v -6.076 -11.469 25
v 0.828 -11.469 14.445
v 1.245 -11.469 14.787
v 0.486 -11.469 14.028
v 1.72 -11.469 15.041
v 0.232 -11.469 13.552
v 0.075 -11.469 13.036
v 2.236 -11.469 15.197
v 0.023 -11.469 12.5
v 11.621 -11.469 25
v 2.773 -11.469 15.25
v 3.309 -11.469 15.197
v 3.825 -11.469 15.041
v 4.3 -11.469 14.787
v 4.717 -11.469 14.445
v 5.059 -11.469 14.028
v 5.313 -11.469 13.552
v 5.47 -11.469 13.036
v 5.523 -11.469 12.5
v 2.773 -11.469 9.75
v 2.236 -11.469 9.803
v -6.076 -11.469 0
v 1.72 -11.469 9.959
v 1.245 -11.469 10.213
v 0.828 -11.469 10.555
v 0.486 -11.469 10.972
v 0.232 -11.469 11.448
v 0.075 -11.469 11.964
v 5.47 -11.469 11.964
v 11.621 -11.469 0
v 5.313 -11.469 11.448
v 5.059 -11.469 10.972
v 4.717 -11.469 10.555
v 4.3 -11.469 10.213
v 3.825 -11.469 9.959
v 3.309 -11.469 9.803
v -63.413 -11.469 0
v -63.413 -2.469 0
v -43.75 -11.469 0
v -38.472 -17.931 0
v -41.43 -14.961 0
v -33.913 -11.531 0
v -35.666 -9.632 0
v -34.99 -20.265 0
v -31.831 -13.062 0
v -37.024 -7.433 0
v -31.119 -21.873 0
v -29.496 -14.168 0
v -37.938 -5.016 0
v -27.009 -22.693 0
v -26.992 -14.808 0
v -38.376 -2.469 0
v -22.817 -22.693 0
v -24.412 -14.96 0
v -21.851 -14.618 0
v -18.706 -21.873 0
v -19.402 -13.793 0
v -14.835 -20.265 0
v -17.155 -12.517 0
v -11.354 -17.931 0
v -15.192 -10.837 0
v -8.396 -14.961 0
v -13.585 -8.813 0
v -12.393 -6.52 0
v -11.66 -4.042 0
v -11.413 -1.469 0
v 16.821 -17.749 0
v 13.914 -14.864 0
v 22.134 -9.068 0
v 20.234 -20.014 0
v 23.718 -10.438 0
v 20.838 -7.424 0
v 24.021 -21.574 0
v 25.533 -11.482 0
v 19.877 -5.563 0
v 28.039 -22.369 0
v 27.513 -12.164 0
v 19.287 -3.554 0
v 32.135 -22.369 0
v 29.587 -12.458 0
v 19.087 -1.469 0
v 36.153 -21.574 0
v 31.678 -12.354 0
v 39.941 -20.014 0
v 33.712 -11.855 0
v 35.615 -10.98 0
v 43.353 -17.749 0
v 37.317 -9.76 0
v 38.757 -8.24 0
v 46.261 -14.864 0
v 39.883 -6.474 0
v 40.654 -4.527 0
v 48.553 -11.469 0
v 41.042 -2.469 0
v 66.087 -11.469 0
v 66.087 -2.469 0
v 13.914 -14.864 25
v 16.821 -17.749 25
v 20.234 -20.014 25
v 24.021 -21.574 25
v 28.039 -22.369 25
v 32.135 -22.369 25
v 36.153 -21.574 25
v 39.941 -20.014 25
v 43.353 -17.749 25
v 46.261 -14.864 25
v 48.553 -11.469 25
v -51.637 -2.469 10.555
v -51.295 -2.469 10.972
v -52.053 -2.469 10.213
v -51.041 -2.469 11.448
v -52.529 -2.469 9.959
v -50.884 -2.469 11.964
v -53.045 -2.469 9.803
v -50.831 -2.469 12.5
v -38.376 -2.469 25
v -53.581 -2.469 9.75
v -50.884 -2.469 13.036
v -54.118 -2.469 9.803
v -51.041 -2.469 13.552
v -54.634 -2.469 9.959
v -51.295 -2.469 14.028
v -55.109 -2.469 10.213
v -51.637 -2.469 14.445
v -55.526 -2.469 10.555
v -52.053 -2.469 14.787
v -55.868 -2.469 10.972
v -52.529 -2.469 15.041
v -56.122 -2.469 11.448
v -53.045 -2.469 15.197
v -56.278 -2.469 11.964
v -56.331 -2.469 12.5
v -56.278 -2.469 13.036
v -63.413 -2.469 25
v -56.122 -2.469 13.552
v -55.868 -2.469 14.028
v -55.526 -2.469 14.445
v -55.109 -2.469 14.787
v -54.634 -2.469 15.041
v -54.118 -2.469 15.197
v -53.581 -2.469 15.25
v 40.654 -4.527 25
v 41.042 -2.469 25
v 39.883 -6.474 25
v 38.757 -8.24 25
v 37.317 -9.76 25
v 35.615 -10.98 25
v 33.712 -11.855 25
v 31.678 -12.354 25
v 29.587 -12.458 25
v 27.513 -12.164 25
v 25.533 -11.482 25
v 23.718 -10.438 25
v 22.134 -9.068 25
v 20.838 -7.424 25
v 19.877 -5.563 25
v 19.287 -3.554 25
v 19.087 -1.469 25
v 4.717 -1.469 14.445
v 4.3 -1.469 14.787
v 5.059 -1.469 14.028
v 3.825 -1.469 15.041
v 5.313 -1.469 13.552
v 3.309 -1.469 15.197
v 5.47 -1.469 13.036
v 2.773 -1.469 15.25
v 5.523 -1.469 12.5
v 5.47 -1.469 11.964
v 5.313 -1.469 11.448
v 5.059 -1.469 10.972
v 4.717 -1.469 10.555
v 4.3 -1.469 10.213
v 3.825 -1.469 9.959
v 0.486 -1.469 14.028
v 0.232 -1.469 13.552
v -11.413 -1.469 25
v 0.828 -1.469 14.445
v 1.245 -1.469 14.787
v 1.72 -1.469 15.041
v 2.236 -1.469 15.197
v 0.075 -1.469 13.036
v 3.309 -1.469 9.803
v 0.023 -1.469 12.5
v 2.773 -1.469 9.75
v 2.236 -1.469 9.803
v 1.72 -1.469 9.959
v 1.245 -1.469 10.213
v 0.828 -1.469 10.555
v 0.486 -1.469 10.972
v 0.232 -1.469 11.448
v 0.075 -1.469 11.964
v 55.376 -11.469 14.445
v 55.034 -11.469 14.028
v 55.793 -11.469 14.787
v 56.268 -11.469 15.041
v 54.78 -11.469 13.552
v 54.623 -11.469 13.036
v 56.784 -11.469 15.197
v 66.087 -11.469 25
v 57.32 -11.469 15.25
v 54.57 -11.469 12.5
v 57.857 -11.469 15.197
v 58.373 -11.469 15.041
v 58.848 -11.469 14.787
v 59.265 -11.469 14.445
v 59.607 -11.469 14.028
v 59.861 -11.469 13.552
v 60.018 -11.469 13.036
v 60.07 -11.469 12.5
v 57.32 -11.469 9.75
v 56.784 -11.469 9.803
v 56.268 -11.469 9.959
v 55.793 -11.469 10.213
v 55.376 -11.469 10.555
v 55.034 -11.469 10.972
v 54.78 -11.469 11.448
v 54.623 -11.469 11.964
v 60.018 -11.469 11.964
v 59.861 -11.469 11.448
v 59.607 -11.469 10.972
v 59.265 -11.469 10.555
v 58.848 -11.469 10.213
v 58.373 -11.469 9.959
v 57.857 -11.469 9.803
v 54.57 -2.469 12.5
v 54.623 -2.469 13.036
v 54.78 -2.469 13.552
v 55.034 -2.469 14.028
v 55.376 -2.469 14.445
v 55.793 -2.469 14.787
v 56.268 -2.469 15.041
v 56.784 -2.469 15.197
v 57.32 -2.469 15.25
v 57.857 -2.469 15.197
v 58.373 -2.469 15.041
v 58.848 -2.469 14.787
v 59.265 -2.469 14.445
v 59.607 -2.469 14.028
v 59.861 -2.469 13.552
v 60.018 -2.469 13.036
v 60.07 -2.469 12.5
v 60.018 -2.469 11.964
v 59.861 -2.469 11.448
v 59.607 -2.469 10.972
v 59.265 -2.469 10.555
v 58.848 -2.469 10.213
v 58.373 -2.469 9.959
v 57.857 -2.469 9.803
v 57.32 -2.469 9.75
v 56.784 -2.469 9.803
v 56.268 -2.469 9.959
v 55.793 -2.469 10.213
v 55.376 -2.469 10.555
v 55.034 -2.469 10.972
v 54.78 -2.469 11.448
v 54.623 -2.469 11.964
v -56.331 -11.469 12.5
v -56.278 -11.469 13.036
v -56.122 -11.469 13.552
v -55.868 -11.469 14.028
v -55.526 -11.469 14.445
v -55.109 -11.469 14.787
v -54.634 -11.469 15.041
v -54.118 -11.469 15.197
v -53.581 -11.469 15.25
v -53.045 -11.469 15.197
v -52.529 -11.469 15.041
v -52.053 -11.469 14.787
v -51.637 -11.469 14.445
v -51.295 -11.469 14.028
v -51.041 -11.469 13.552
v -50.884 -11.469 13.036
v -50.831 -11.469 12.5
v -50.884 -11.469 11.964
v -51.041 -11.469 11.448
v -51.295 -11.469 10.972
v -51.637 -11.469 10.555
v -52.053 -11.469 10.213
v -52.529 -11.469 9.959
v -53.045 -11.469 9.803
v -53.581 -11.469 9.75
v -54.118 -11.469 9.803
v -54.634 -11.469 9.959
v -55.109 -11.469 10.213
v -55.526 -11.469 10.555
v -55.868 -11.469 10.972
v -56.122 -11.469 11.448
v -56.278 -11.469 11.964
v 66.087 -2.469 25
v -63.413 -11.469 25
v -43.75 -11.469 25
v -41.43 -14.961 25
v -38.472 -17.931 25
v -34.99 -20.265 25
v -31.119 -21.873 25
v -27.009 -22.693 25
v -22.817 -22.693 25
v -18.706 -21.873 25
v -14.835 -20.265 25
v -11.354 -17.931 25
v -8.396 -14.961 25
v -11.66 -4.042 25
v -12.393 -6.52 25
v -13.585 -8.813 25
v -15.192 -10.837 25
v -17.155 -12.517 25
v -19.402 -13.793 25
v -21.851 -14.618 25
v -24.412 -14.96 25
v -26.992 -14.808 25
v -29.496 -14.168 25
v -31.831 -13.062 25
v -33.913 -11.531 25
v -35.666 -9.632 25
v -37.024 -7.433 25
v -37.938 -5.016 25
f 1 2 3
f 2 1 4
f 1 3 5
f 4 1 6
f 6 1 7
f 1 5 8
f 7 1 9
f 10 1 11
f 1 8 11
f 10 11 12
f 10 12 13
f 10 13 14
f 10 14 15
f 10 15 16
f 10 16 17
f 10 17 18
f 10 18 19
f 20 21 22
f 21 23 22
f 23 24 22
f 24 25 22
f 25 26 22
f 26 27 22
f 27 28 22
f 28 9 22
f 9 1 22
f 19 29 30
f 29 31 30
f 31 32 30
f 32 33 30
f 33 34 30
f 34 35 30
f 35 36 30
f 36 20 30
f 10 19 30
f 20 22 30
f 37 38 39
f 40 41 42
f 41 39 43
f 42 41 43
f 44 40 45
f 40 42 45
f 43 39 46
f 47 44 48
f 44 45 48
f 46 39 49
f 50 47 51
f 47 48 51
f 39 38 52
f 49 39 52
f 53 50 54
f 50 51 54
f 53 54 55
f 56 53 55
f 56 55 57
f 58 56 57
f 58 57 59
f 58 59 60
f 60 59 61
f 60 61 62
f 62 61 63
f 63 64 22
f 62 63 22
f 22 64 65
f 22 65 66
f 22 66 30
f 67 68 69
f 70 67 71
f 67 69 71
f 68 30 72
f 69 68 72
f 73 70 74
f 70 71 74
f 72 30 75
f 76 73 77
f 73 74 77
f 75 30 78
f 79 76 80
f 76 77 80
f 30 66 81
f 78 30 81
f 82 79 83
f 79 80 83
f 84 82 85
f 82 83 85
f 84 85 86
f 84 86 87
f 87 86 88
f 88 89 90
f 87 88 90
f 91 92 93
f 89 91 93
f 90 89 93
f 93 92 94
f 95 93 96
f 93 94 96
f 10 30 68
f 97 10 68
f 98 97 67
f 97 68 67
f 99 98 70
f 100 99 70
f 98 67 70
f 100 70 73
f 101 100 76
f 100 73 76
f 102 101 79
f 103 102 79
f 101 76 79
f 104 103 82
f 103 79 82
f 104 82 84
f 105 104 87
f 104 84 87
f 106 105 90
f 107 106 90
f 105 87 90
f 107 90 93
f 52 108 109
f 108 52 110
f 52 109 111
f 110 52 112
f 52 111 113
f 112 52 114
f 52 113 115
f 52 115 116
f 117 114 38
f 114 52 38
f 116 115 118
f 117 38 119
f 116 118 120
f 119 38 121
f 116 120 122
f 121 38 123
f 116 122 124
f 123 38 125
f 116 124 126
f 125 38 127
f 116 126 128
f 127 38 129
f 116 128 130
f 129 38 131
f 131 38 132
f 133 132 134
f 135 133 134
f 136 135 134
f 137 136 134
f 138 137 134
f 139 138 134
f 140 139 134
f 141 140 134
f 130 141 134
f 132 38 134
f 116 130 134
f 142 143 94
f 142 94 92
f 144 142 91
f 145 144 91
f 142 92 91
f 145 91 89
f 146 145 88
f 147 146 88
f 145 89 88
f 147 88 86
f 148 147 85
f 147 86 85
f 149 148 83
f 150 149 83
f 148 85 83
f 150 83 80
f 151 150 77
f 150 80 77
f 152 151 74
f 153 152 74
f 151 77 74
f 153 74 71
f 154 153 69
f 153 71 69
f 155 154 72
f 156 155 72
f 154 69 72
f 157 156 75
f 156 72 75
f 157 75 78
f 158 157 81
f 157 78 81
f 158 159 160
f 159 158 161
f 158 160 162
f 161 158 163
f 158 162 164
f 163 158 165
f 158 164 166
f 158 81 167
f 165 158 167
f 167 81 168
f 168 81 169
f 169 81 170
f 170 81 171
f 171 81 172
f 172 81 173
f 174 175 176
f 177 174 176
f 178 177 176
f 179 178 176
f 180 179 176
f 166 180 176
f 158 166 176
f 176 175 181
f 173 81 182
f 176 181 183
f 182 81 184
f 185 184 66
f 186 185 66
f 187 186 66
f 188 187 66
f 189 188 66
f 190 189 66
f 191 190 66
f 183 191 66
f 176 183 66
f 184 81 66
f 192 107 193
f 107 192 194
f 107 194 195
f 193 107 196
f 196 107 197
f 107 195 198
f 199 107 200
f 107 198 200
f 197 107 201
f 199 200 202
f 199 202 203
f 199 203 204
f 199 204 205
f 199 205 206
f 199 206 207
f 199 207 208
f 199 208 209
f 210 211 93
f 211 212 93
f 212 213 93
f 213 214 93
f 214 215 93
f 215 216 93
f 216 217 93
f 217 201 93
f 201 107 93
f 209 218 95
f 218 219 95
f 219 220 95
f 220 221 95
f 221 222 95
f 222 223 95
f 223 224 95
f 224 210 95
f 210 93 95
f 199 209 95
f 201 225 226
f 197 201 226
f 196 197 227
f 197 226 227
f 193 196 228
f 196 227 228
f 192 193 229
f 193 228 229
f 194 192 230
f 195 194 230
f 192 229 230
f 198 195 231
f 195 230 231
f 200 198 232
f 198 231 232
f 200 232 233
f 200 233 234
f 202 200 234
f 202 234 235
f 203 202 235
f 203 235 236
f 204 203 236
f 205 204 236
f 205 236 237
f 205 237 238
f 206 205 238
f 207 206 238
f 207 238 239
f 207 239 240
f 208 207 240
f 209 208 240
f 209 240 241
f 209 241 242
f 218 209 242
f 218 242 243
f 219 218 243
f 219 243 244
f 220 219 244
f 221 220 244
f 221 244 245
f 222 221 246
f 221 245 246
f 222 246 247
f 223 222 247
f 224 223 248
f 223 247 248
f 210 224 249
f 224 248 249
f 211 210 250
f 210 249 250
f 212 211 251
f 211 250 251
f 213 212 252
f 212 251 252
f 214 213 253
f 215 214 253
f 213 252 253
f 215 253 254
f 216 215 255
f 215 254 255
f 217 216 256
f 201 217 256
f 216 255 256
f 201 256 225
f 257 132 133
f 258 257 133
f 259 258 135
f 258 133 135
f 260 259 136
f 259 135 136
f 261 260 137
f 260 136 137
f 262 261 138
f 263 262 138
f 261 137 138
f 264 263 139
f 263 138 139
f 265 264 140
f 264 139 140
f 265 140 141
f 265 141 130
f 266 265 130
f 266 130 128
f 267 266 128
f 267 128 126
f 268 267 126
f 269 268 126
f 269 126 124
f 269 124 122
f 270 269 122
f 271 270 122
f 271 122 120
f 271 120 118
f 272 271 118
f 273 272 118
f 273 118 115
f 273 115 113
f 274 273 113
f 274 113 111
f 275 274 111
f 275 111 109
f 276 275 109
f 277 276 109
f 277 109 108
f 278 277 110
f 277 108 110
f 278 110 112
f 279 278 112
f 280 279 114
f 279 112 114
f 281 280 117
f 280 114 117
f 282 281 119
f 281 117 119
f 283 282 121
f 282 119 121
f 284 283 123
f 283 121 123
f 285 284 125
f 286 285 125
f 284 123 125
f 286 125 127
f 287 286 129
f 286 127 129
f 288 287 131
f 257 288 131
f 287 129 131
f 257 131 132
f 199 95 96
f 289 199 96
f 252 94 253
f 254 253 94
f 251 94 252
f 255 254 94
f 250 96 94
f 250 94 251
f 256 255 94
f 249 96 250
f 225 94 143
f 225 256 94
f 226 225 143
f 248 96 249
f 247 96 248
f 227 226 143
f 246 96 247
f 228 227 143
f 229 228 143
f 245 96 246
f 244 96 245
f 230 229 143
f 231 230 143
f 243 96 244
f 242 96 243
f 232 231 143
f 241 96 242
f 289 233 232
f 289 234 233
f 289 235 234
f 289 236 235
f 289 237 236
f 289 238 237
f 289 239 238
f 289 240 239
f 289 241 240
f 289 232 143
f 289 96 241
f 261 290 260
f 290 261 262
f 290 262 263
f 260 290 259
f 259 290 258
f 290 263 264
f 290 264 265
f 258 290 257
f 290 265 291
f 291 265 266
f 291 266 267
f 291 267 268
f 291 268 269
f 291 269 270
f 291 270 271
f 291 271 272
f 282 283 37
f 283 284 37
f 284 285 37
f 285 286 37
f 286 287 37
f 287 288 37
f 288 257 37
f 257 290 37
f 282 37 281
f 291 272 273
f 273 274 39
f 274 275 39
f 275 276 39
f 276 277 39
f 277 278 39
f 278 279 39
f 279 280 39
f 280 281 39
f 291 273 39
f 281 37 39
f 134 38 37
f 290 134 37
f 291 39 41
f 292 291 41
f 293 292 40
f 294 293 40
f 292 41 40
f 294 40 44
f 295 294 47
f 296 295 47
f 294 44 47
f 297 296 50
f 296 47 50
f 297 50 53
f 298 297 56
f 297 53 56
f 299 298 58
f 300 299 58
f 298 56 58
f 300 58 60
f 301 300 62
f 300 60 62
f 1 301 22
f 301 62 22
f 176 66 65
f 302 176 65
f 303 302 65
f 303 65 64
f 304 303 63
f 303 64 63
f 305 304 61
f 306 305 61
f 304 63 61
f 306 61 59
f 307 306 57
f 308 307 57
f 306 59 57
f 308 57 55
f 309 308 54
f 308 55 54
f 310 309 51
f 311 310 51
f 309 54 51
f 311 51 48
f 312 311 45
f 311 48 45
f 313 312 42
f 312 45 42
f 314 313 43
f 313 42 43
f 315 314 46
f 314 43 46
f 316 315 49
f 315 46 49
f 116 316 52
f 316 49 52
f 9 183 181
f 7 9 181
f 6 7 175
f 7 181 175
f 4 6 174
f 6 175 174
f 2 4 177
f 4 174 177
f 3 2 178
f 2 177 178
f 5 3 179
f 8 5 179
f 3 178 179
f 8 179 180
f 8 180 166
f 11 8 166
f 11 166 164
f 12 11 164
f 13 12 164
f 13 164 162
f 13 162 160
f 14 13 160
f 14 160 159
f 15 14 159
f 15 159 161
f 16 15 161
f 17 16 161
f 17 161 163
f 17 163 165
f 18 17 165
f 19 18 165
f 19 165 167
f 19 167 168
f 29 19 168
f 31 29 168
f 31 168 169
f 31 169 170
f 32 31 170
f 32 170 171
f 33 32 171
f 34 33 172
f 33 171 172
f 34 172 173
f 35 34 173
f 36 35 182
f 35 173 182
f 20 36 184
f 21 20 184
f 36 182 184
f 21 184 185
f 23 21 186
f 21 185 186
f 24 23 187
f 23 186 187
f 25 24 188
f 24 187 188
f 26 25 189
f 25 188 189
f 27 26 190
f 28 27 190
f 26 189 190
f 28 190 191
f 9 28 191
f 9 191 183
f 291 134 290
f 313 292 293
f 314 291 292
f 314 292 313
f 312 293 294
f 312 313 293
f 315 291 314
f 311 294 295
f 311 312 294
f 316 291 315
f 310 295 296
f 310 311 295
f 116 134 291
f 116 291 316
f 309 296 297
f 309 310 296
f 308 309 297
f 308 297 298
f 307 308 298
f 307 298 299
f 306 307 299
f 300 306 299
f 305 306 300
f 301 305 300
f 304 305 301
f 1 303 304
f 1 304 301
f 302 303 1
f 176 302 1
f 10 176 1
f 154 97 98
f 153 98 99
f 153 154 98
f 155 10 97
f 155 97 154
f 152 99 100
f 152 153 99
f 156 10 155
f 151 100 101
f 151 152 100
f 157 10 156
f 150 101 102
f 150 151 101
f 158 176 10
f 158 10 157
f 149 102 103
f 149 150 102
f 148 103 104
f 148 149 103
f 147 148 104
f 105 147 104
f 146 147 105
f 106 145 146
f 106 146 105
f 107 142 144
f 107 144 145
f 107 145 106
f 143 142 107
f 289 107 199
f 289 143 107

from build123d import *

# Parameters (mm, degrees)
F1_DEPTH       = 25
F5_D           = 5.5
F5_DEPTH       = 14.1
F5_TIP         = 1.6523667023
F5_ON_F3_D     = 5.5
F5_ON_F3_DEPTH = 14.1
F5_ON_F3_TIP   = 1.6523667023
F5_ON_F4_D     = 5.5
F5_ON_F4_DEPTH = 14.1
F5_ON_F4_TIP   = 1.6523667023
F6_W           = 1
F6_H           = 25
F7_DEPTH       = 30
F8_W           = 1
F8_H           = 25
F9_DEPTH       = 30


with BuildPart() as f1:
    # F0 (on Top) → F1 (new body)
    with BuildSketch(Plane.XY):
        with BuildLine():
            Line((-38.4127462552, -1.4693210872), (-63.4127462552, -1.4693210872))
            Line((-63.4127462552, -1.4693210872), (-63.4127462552, -11.4693210872))
            Line((-63.4127462552, -11.4693210872), (-43.749593064, -11.4693210872))
            ThreePointArc((-43.749593064, -11.4693210872), (-24.9127462552, -22.7959897839), (-6.0758994463, -11.4693210872))
            Line((-6.0758994463, -11.4693210872), (11.6210684322, -11.4693210872))
            ThreePointArc((11.6210684322, -11.4693210872), (30.0872537448, -22.4693210872), (48.5534390575, -11.4693210872))
            Line((48.5534390575, -11.4693210872), (66.0872537448, -11.4693210872))
            Line((66.0872537448, -11.4693210872), (66.0872537448, -1.4693210872))
            Line((66.0872537448, -1.4693210872), (41.0872537448, -1.4693210872))
            ThreePointArc((41.0872537448, -1.4693210872), (30.0872537448, -12.4693210872), (19.0872537448, -1.4693210872))
            Line((19.0872537448, -1.4693210872), (-11.4127462552, -1.4693210872))
            ThreePointArc((-11.4127462552, -1.4693210872), (-24.9127462552, -14.9693210872), (-38.4127462552, -1.4693210872))
        make_face()
    extrude(amount=F1_DEPTH)

    # F5
    with Locations(Plane.XZ.offset(11.4693210872)):
        with Locations((-53.5811696596, 12.5)):
            Hole(F5_D / 2, depth=F5_DEPTH)
            with Locations((0, 0, -(F5_DEPTH + F5_TIP / 2))):  # 118° drill point
                Cone(0, F5_D / 2, F5_TIP, mode=Mode.SUBTRACT)

    # F5 on F3
    with Locations(Plane.XZ.offset(11.4693210872)):
        with Locations((57.3203464011, 12.5)):
            Hole(F5_ON_F3_D / 2, depth=F5_ON_F3_DEPTH)
            with Locations((0, 0, -(F5_ON_F3_DEPTH + F5_ON_F3_TIP / 2))):  # 118° drill point
                Cone(0, F5_ON_F3_D / 2, F5_ON_F3_TIP, mode=Mode.SUBTRACT)

    # F5 on F4
    with Locations(Plane.XZ.offset(11.4693210872)):
        with Locations((2.772584493, 12.5)):
            Hole(F5_ON_F4_D / 2, depth=F5_ON_F4_DEPTH)
            with Locations((0, 0, -(F5_ON_F4_DEPTH + F5_ON_F4_TIP / 2))):  # 118° drill point
                Cone(0, F5_ON_F4_D / 2, F5_ON_F4_TIP, mode=Mode.SUBTRACT)

    # F6 (on face) → F7 (cut)
    with BuildSketch(Plane.YZ.offset(66.0872537448)):
        with Locations((-1.9693210872, 12.5)):
            Rectangle(F6_W, F6_H)
    extrude(amount=-F7_DEPTH, mode=Mode.SUBTRACT)

    # F8 (on face) → F9 (cut)
    with BuildSketch(Plane(origin=(-63.4127462552, 0, 0), x_dir=(0, -1, 0), z_dir=(-1, 0, 0))):
        with Locations((1.9693210872, 12.5)):
            Rectangle(F8_W, F8_H)
    extrude(amount=-F9_DEPTH, mode=Mode.SUBTRACT)


solid = f1.part
